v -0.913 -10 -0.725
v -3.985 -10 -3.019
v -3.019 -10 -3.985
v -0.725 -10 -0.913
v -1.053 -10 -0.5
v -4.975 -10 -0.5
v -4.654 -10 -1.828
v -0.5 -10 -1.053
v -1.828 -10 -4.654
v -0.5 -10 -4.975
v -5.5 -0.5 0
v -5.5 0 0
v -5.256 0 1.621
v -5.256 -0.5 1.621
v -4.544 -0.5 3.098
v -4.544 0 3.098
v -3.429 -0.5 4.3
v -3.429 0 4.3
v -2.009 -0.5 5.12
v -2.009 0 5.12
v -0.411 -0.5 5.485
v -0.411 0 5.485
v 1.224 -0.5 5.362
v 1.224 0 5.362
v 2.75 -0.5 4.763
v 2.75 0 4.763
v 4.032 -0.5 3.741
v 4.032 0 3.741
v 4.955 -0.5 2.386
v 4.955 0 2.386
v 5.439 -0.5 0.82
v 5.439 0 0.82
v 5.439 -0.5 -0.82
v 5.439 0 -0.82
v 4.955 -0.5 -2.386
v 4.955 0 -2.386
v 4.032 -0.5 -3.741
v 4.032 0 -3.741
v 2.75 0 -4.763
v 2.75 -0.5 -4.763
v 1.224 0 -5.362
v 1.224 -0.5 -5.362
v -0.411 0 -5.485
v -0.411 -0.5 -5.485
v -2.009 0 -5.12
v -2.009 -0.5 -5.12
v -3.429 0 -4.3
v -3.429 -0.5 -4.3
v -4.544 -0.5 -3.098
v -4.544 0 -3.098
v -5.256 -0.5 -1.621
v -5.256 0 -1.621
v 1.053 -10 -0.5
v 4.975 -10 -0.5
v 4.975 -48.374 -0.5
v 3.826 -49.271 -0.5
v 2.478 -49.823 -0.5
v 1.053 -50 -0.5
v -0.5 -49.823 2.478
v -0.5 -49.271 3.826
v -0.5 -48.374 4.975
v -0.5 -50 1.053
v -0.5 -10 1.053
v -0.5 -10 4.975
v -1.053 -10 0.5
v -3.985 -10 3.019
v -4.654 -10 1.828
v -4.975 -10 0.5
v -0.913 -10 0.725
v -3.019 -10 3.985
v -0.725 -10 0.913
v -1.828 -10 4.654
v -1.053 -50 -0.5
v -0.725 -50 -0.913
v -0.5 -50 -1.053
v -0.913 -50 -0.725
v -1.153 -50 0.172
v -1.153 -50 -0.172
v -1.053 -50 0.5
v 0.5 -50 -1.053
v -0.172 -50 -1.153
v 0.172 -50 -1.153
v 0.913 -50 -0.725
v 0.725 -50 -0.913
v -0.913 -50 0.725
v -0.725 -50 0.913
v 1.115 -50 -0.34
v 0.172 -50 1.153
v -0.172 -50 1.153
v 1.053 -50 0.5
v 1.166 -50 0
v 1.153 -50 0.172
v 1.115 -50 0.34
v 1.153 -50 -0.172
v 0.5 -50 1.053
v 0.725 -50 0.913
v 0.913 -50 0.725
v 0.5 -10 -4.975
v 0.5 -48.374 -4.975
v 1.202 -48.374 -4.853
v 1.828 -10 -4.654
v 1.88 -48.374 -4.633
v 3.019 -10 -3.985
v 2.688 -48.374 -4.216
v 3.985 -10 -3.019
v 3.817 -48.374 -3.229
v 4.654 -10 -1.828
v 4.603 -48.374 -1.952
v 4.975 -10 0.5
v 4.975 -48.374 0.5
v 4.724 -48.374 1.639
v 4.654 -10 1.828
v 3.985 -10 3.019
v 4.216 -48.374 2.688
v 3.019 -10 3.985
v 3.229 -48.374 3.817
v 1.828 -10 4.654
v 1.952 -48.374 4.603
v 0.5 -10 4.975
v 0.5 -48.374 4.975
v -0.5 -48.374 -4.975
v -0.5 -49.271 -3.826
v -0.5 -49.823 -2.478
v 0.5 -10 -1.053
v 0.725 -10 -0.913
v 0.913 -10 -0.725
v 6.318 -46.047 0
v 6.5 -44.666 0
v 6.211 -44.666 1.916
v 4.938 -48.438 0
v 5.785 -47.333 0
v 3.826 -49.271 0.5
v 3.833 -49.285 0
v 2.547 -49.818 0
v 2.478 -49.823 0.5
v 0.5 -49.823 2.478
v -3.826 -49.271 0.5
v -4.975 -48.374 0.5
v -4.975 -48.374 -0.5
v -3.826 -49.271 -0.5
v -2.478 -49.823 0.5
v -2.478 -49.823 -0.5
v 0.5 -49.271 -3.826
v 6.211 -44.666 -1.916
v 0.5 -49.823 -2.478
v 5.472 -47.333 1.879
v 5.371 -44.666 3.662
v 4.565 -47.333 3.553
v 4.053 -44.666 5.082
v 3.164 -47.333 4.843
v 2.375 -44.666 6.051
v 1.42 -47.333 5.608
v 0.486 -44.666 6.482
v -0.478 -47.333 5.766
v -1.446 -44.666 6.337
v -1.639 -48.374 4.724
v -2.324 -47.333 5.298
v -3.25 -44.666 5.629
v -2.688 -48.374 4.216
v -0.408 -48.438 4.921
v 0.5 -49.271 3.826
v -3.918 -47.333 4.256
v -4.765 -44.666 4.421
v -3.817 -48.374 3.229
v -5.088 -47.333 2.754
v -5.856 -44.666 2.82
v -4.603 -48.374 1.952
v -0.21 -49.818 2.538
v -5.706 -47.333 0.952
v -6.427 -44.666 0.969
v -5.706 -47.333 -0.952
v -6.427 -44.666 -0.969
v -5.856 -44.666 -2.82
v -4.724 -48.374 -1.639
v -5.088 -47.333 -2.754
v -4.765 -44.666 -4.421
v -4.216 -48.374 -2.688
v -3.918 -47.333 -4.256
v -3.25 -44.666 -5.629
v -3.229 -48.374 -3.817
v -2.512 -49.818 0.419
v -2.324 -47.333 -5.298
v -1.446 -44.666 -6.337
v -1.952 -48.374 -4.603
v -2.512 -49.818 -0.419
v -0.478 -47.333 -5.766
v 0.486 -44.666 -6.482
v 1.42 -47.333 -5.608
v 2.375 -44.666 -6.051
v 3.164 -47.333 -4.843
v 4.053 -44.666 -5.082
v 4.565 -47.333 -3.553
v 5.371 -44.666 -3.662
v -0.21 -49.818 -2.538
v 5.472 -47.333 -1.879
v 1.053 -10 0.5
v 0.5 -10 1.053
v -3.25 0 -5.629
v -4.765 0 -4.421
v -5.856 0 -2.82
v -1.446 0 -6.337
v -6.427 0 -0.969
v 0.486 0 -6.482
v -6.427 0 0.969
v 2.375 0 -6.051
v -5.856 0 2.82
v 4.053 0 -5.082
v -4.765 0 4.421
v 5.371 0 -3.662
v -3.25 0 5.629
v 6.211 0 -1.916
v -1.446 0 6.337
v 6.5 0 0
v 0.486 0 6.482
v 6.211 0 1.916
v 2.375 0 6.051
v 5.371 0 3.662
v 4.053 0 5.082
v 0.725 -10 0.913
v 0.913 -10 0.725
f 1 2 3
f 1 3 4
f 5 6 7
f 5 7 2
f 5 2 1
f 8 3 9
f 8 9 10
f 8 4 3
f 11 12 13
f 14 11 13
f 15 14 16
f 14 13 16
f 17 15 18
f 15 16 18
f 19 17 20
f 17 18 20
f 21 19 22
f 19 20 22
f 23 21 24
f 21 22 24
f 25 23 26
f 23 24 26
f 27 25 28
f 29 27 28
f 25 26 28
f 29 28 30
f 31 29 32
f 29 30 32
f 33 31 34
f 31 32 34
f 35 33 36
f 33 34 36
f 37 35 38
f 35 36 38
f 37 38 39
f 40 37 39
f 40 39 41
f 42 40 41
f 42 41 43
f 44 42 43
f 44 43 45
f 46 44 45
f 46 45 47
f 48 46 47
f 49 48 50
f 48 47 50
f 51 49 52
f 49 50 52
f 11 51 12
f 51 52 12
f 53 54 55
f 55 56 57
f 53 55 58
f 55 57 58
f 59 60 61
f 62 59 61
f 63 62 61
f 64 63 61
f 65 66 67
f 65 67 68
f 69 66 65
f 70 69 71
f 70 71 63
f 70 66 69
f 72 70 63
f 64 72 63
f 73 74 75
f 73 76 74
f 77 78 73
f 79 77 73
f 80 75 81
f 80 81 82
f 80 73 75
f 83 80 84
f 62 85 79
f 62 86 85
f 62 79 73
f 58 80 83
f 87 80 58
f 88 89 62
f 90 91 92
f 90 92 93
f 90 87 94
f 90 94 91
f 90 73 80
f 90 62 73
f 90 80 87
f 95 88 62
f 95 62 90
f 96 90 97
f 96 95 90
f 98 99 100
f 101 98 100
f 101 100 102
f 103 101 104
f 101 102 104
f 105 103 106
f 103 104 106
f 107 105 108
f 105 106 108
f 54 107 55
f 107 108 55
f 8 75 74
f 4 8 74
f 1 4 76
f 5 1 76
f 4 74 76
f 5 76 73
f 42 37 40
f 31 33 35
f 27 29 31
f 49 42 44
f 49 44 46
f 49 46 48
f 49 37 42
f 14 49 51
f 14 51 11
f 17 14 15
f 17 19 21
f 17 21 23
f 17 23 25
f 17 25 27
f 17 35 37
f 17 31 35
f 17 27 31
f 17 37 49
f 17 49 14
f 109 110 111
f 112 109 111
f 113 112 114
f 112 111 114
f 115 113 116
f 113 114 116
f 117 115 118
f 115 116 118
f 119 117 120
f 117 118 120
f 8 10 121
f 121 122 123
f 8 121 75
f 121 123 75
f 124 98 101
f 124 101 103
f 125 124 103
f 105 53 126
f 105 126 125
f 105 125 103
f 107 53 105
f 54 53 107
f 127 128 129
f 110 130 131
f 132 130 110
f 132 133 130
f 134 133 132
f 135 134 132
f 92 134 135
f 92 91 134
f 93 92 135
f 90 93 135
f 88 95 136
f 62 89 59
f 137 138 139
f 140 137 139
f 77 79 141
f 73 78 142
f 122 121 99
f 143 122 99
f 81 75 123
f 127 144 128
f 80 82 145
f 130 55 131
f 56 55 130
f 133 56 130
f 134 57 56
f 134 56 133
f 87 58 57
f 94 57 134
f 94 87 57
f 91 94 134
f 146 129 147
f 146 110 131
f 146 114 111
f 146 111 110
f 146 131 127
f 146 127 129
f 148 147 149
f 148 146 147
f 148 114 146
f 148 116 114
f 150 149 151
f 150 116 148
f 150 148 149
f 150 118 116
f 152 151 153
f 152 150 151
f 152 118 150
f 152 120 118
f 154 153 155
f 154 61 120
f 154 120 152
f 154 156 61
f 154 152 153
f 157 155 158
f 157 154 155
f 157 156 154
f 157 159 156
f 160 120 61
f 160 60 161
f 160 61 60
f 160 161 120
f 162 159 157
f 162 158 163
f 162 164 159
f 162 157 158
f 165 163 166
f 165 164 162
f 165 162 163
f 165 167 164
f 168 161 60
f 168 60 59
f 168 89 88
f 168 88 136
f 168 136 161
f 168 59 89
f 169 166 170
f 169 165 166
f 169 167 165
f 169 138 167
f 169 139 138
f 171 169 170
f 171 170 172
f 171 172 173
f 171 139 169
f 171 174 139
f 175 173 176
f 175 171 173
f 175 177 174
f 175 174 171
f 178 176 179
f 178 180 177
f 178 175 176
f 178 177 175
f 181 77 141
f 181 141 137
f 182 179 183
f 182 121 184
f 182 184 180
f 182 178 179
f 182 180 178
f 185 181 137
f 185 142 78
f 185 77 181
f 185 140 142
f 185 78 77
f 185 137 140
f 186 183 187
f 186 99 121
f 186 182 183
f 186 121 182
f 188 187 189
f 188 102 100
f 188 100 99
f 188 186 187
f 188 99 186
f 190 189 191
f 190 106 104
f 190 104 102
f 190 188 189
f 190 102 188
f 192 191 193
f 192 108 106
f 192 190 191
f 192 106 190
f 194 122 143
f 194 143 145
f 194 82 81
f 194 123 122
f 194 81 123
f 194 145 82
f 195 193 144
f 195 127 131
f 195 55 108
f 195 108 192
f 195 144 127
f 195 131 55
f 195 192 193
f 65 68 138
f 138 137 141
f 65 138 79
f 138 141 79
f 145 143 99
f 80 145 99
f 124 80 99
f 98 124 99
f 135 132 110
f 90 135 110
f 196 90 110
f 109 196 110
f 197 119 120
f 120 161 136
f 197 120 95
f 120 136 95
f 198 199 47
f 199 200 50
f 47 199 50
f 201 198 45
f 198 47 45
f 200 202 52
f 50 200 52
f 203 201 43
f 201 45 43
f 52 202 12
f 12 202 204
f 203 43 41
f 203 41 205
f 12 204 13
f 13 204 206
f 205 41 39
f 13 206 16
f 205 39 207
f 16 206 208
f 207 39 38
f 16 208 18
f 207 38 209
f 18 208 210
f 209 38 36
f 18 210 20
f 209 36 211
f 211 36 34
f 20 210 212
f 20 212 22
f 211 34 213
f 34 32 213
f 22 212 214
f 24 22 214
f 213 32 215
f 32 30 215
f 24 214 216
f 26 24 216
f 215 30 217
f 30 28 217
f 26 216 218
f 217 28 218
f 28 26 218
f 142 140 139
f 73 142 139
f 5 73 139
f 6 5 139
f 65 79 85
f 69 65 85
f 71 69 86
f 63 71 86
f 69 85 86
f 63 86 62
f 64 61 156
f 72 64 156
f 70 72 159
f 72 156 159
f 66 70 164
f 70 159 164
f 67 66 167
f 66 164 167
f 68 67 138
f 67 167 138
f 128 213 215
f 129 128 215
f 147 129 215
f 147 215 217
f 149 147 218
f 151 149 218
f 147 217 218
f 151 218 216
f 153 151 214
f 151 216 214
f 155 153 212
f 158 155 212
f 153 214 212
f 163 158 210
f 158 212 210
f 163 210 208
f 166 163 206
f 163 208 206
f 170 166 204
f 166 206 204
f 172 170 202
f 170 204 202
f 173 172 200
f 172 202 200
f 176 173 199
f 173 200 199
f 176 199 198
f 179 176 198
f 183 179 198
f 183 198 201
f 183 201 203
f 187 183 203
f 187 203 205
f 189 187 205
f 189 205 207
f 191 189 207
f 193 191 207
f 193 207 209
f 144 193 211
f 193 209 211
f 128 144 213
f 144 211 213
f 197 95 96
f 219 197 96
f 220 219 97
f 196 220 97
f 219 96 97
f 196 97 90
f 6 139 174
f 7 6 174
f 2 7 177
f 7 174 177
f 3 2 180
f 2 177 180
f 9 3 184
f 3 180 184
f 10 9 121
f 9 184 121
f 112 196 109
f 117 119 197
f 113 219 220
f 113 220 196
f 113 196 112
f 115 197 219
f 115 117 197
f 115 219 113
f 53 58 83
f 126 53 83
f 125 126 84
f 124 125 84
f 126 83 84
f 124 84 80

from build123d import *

# Parameters (mm, degrees)
F0_R     = 6.5
F1_DEPTH = 50
F2_R     = 5.334
F4_DEPTH = 40
F5_R     = 5.5
F6_DEPTH = 0.5


with BuildPart() as f1:
    # F0 (on Front) → F1 (new body)
    with BuildSketch(Plane.XZ):
        Circle(F0_R)
    extrude(amount=F1_DEPTH)

    # F2
    f2_edges = [f1.edges().sort_by_distance(p)[0] for p in [
        (-6.5, -50, 0),
    ]]
    fillet(f2_edges, radius=F2_R)

    # F3 (on face) → F4 (cut)
    with BuildSketch(Plane.XZ.offset(50)):
        with BuildLine():
            Line((-0.5, 1.0533546411), (-0.5, 4.9749371855))
            ThreePointArc((-0.5, 4.9749371855), (-3.5355339059, 3.5355339059), (-4.9749371855, 0.5))
            Line((-4.9749371855, 0.5), (-1.0533546411, 0.5))
            ThreePointArc((-1.0533546411, 0.5), (-0.8244865069, 0.8244865069), (-0.5, 1.0533546411))
        make_face()
        with BuildLine():
            Line((1.0533546411, 0.5), (4.9749371855, 0.5))
            ThreePointArc((4.9749371855, 0.5), (3.5355339059, 3.5355339059), (0.5, 4.9749371855))
            Line((0.5, 4.9749371855), (0.5, 1.0533546411))
            ThreePointArc((0.5, 1.0533546411), (0.8244865069, 0.8244865069), (1.0533546411, 0.5))
        make_face()
        with BuildLine():
            ThreePointArc((0.5, -4.9749371855), (3.5355339059, -3.5355339059), (4.9749371855, -0.5))
            Line((4.9749371855, -0.5), (1.0533546411, -0.5))
            ThreePointArc((1.0533546411, -0.5), (0.8244865069, -0.8244865069), (0.5, -1.0533546411))
            Line((0.5, -1.0533546411), (0.5, -4.9749371855))
        make_face()
        with BuildLine():
            ThreePointArc((-4.9749371855, -0.5), (-3.5355339059, -3.5355339059), (-0.5, -4.9749371855))
            Line((-0.5, -4.9749371855), (-0.5, -1.0533546411))
            ThreePointArc((-0.5, -1.0533546411), (-0.8244865069, -0.8244865069), (-1.0533546411, -0.5))
            Line((-1.0533546411, -0.5), (-4.9749371855, -0.5))
        make_face()
    extrude(amount=-F4_DEPTH, mode=Mode.SUBTRACT)

    # F5 (on face) → F6 (cut)
    with BuildSketch(Plane(origin=(0, 0, 0), x_dir=(-1, 0, 0), z_dir=(0, 1, 0))):
        Circle(F5_R)
    extrude(amount=-F6_DEPTH, mode=Mode.SUBTRACT)


solid = f1.part
